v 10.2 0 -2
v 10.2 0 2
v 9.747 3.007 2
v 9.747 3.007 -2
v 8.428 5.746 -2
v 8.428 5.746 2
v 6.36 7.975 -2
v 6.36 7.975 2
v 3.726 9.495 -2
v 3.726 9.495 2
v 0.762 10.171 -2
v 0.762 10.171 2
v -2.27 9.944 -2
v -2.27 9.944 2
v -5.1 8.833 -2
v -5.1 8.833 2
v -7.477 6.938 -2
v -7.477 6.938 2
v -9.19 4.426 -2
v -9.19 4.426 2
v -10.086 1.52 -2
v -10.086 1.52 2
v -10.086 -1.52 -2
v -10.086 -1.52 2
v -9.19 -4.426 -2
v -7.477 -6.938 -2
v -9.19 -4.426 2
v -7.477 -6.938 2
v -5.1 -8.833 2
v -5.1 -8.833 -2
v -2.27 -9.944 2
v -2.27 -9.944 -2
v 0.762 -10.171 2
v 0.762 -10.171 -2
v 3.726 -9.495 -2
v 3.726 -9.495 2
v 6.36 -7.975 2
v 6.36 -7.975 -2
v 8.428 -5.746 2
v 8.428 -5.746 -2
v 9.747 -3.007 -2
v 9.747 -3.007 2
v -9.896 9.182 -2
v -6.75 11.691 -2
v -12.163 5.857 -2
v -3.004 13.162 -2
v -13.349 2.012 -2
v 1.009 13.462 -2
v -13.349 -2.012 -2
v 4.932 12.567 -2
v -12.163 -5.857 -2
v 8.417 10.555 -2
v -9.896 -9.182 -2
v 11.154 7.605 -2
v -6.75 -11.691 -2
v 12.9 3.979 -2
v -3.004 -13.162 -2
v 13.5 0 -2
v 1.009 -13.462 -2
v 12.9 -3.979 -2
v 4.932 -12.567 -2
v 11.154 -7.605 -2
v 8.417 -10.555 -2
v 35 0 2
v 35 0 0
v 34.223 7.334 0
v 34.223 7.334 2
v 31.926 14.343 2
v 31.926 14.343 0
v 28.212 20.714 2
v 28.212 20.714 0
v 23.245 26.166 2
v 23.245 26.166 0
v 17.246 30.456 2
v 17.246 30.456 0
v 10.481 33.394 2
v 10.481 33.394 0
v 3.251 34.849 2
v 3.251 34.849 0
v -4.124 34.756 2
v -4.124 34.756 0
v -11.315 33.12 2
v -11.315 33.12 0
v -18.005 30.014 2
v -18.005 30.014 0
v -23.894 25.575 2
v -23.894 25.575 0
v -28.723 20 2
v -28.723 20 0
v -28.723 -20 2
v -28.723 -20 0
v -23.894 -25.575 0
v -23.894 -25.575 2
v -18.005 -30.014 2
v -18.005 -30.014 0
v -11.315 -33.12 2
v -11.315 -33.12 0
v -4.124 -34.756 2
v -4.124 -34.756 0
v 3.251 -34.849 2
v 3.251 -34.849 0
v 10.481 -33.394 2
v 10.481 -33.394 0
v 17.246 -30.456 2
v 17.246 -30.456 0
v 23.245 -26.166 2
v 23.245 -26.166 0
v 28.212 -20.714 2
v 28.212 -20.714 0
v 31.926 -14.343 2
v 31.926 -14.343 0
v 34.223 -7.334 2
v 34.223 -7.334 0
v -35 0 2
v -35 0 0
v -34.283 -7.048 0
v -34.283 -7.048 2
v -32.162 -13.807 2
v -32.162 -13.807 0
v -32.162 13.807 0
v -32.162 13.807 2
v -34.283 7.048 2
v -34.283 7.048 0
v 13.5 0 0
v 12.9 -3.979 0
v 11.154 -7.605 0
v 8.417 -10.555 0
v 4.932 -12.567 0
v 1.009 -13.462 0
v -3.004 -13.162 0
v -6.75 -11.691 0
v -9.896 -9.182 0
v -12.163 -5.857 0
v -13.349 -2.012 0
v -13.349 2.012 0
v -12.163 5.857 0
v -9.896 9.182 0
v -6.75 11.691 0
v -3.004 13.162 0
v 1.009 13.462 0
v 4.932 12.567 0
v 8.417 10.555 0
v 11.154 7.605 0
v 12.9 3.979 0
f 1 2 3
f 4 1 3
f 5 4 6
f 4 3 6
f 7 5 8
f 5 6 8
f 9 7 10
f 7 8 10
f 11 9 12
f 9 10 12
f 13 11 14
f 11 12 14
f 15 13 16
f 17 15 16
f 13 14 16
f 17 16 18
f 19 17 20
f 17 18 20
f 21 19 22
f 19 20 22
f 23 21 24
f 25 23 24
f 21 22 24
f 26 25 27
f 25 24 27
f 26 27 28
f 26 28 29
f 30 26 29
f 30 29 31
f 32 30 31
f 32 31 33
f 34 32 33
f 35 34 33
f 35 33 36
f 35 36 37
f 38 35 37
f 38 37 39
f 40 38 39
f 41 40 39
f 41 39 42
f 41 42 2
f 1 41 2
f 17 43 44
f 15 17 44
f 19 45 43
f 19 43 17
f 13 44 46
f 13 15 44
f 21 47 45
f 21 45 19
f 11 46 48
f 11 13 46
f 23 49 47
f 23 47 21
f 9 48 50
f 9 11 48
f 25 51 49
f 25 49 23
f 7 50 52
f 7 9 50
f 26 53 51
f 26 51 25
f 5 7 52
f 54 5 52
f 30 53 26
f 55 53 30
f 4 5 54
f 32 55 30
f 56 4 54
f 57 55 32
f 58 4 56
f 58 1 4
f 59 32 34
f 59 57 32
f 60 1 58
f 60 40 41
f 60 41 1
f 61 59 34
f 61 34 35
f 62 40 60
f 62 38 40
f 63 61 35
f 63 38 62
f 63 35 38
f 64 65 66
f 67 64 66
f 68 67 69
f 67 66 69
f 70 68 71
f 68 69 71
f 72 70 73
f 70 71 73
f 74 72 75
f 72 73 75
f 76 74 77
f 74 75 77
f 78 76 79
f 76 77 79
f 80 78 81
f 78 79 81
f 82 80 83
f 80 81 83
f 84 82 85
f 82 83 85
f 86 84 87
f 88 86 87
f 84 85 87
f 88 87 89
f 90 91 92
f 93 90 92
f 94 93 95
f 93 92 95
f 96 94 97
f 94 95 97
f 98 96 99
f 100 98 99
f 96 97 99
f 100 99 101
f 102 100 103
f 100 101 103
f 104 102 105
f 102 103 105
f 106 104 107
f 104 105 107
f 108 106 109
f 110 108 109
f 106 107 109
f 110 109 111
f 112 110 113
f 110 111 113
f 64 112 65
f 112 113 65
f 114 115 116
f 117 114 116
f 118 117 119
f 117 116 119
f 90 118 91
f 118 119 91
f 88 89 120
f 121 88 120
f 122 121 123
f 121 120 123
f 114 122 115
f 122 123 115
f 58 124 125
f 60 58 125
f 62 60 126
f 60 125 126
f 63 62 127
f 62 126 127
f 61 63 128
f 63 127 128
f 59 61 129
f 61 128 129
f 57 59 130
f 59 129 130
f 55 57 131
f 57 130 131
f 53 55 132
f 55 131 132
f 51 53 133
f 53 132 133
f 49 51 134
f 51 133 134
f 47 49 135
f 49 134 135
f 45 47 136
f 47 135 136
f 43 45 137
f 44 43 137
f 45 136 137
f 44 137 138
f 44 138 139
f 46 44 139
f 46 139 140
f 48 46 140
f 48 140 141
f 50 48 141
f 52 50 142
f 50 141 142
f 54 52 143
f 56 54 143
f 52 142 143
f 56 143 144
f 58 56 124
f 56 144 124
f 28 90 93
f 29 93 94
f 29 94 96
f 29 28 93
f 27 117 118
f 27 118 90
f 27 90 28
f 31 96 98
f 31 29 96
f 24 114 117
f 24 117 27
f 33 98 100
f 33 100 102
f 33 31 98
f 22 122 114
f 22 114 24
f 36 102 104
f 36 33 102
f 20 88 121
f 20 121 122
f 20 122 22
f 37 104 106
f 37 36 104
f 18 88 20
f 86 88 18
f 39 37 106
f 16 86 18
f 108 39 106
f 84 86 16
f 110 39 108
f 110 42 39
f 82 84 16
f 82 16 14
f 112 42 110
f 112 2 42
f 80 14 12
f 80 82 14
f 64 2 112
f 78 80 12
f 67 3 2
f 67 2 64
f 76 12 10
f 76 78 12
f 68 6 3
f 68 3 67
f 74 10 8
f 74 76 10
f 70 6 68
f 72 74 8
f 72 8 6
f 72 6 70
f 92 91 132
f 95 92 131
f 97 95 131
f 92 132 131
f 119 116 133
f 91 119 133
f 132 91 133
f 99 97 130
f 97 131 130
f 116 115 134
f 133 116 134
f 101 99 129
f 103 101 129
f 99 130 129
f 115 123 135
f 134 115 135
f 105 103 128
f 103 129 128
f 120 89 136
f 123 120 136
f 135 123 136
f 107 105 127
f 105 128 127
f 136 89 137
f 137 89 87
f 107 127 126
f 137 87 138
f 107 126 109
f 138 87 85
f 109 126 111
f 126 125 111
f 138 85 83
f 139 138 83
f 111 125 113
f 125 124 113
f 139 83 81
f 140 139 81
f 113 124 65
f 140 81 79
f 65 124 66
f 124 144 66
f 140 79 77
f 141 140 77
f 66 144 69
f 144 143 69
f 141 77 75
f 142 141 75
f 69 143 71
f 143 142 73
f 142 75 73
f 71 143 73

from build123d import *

# Parameters (mm, degrees)
F1_DEPTH = 3
F2_R     = 13.5
F2_R_2   = 10
F3_DEPTH = 2
F4_DEPTH = 1
F5_R     = 10.2
F5_R_2   = 10
F6_DEPTH = 25


with BuildPart() as f1:
    # F0 (on Top) → F1 (new body)
    with BuildSketch(Plane.XY):
        with BuildLine():
            ThreePointArc((35, 0), (10.4809717311, 33.3938502059), (-28.7228132327, 20))
            Line((-28.7228132327, 20), (20, 20))
            Line((20, 20), (20, -20))
            Line((20, -20), (-28.7228132327, -20))
            ThreePointArc((-28.7228132327, -20), (10.4809717311, -33.3938502059), (35, 0))
        make_face()
        with BuildLine():
            ThreePointArc((-28.7228132327, 20), (-33.3938502059, 10.4809717311), (-35, 0))
            ThreePointArc((-35, 0), (-33.3938502059, -10.4809717311), (-28.7228132327, -20))
            Line((-28.7228132327, -20), (20, -20))
            Line((20, -20), (20, 20))
            Line((20, 20), (-28.7228132327, 20))
        make_face()
        with BuildLine():
            ThreePointArc((-10, 0), (0, 10), (10, 0))
            ThreePointArc((10, 0), (0, -10), (-10, 0))
        make_face(mode=Mode.SUBTRACT)
    extrude(amount=F1_DEPTH)

    # F2 (on face) → F3 (join)
    with BuildSketch(Plane(origin=(0, 0, 0), x_dir=(1, 0, 0), z_dir=(0, 0, -1))):
        Circle(F2_R)
        Circle(F2_R_2, mode=Mode.SUBTRACT)
    extrude(amount=F3_DEPTH)

    # F4 (cut): a face of the model
    f4_faces = [f1.faces().sort_by_distance(p)[0] for p in [
        (-34.0100505063, 0, 3),
    ]]
    extrude(f4_faces, amount=-F4_DEPTH, mode=Mode.SUBTRACT)

    # F5 (on face) → F6 (cut)
    with BuildSketch(Plane.XY.offset(2)):
        Circle(F5_R)
        Circle(F5_R_2, mode=Mode.SUBTRACT)
    extrude(amount=-F6_DEPTH, mode=Mode.SUBTRACT)


solid = f1.part
